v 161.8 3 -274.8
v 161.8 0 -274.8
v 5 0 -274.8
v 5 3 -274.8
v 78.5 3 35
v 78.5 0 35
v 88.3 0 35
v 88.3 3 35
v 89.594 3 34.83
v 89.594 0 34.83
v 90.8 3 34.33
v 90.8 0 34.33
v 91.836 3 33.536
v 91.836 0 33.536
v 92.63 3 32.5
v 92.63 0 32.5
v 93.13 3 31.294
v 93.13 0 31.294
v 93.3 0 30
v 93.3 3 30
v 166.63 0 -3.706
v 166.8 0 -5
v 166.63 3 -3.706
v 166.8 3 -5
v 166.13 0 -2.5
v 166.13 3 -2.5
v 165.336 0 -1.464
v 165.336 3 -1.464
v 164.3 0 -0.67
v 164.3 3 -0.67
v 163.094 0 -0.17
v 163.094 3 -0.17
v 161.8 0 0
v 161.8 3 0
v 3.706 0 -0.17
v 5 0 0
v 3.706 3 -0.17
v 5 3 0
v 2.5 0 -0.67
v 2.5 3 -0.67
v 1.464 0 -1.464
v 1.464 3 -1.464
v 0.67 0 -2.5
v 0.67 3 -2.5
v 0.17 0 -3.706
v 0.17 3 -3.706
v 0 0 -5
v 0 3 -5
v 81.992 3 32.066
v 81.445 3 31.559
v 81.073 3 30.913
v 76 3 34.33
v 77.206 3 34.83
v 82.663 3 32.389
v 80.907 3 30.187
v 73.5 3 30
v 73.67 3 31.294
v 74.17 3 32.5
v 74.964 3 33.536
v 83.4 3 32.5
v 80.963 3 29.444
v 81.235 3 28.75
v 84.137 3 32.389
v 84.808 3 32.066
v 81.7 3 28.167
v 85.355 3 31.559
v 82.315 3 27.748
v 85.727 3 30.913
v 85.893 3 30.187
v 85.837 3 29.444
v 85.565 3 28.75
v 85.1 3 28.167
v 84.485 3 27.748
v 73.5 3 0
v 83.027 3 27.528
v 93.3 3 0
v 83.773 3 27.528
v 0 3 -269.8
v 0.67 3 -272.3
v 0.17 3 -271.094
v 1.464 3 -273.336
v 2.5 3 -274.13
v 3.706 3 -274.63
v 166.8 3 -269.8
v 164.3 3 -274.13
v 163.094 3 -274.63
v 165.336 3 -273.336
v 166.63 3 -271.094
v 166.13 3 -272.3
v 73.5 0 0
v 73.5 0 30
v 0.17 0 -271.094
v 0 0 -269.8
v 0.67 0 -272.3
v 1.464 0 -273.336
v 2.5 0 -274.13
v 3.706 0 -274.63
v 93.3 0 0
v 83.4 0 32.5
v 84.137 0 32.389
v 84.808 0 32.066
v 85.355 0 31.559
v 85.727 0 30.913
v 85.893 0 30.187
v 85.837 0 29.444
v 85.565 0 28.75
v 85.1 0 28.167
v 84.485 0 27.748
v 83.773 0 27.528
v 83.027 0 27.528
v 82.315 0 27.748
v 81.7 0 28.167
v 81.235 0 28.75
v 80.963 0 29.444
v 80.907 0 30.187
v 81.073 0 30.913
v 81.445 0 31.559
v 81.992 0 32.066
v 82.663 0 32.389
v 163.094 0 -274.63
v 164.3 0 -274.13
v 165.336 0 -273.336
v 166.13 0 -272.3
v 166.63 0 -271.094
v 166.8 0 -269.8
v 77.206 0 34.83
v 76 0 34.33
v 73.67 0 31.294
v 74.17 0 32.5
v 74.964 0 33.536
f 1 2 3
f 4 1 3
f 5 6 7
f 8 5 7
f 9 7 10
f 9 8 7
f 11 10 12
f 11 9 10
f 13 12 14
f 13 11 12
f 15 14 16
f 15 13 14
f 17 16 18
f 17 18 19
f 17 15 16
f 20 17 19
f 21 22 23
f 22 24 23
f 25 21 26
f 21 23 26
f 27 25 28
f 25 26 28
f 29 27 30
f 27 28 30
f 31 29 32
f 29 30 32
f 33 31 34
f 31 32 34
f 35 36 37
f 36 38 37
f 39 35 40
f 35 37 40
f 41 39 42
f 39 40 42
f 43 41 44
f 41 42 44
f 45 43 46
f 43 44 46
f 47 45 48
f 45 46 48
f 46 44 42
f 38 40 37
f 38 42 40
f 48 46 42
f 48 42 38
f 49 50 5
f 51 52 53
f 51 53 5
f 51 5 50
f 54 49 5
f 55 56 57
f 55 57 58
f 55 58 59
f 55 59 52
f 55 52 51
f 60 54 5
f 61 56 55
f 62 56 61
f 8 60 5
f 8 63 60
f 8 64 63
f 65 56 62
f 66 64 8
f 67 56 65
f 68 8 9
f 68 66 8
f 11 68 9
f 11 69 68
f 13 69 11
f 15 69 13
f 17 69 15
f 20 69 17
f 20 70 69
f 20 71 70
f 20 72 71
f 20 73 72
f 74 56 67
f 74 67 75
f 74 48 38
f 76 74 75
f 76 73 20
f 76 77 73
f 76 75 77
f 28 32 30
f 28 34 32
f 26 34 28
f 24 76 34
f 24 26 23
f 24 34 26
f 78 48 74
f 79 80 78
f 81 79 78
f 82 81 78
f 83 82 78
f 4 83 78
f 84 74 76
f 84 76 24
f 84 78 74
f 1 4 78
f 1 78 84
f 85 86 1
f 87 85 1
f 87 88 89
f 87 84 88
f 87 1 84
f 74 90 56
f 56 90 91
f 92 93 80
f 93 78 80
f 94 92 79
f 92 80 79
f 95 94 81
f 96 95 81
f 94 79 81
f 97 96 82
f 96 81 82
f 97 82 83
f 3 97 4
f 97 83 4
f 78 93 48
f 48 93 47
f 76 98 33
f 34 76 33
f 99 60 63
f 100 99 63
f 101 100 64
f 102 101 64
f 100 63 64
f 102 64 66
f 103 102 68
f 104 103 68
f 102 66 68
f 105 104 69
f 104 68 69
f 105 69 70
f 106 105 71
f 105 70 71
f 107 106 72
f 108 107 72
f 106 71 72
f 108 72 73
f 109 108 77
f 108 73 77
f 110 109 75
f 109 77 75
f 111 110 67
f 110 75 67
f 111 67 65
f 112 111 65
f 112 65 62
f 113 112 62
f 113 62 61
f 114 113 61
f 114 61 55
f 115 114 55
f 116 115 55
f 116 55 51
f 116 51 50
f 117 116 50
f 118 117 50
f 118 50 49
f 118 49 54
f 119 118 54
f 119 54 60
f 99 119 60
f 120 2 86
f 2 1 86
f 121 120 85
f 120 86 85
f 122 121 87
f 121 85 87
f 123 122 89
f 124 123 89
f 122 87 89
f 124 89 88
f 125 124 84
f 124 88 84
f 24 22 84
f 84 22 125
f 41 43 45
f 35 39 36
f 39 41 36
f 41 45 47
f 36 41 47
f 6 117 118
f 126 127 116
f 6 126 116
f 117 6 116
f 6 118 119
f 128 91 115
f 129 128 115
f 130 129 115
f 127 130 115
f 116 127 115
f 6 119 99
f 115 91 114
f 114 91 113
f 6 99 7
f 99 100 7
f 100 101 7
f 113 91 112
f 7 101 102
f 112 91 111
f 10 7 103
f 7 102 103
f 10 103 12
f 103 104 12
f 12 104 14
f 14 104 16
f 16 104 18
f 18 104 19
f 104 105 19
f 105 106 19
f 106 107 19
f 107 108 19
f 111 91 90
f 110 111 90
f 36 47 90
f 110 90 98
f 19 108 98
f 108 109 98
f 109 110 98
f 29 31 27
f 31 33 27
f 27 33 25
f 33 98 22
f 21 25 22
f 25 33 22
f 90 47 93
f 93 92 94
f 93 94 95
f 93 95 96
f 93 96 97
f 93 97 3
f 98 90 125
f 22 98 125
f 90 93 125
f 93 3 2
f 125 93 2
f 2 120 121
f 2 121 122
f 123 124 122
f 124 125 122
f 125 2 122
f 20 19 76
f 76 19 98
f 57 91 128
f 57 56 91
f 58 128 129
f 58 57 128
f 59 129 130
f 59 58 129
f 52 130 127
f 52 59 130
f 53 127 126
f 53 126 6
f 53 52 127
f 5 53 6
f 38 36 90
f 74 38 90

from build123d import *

# Parameters (mm, degrees)
BOSS_EXTRUDE1_DEPTH = 3
SKETCH2_R           = 2.5
CUT_EXTRUDE1_DEPTH  = 5
FILLET1_R           = 5


with BuildPart() as part:
    # Sketch1 → Boss-Extrude1 (new body)
    with BuildSketch(Plane(origin=(0, 0, 0), x_dir=(1, 0, 0), z_dir=(0, 1, 0))):
        Polygon((0, 0), (73.5, 0), (73.5, -35), (93.3, -35), (93.3, 0), (166.8, 0), (166.8, 274.8), (0, 274.8), align=None)
    extrude(amount=BOSS_EXTRUDE1_DEPTH)

    # Sketch2 → Cut-Extrude1 (cut)
    with BuildSketch(Plane(origin=(0, 3, 0), x_dir=(1, 0, 0), z_dir=(0, 1, 0))):
        with Locations(Location((83.4, -30, 0), (0, 0, 270))):
            Circle(SKETCH2_R)
    extrude(amount=-CUT_EXTRUDE1_DEPTH, mode=Mode.SUBTRACT)

    # Fillet1
    fillet1_edges = [part.edges().sort_by_distance(p)[0] for p in [
        (0, 1.5, -274.8),
        (166.8, 1.5, -274.8),
        (166.8, 1.5, 0),
        (93.3, 1.5, 35),
        (73.5, 1.5, 35),
        (0, 1.5, 0),
    ]]
    fillet(fillet1_edges, radius=FILLET1_R)


solid = part.part
